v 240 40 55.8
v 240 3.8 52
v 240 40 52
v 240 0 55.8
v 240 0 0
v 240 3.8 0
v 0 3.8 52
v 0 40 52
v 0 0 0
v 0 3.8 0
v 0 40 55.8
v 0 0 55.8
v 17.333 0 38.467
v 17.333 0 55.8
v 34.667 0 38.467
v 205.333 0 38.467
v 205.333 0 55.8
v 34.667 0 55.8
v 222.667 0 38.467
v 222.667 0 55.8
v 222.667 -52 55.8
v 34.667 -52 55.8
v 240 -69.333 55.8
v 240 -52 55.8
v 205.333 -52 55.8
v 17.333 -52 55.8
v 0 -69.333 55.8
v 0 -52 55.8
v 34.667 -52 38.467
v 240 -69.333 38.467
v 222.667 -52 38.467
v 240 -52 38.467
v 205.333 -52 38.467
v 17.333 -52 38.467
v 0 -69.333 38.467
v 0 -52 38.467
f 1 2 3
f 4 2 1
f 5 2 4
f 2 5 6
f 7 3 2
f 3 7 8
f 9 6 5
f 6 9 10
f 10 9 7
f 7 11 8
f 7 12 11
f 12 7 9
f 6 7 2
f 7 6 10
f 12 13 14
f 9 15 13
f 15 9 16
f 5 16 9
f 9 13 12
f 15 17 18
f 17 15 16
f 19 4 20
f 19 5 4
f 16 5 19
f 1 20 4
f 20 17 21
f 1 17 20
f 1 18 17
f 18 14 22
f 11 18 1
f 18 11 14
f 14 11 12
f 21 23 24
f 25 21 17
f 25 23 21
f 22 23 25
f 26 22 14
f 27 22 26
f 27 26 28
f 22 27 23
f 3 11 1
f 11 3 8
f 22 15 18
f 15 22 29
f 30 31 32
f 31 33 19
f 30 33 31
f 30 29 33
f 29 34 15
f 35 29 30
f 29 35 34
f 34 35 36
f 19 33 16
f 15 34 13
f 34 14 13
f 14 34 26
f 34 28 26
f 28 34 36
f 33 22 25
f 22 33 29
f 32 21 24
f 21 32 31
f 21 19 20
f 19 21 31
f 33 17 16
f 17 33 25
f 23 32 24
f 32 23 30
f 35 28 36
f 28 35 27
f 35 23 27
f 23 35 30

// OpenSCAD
//Enter OpenSCAD code here.
echo("Version:",version());

t=3.8;

w=240;

//front height
fh=52;
th=40;

//griff tiefe
gt=52;
gh=gt/3;

//hoehe griff
hg=fh-gh+t;

//griffversatz nach innen
gv=gh;

cube([w,t,fh]);

translate([0,0,fh])
cube([w,th,t]);

translate([gv,-gt,hg])
cube([gh,gt,gh]);

translate([w-gh-gv,-gt,hg])
cube([gh,gt,gh]);

translate([0,-gt-gh,hg])
cube([w,gh,gh]);
